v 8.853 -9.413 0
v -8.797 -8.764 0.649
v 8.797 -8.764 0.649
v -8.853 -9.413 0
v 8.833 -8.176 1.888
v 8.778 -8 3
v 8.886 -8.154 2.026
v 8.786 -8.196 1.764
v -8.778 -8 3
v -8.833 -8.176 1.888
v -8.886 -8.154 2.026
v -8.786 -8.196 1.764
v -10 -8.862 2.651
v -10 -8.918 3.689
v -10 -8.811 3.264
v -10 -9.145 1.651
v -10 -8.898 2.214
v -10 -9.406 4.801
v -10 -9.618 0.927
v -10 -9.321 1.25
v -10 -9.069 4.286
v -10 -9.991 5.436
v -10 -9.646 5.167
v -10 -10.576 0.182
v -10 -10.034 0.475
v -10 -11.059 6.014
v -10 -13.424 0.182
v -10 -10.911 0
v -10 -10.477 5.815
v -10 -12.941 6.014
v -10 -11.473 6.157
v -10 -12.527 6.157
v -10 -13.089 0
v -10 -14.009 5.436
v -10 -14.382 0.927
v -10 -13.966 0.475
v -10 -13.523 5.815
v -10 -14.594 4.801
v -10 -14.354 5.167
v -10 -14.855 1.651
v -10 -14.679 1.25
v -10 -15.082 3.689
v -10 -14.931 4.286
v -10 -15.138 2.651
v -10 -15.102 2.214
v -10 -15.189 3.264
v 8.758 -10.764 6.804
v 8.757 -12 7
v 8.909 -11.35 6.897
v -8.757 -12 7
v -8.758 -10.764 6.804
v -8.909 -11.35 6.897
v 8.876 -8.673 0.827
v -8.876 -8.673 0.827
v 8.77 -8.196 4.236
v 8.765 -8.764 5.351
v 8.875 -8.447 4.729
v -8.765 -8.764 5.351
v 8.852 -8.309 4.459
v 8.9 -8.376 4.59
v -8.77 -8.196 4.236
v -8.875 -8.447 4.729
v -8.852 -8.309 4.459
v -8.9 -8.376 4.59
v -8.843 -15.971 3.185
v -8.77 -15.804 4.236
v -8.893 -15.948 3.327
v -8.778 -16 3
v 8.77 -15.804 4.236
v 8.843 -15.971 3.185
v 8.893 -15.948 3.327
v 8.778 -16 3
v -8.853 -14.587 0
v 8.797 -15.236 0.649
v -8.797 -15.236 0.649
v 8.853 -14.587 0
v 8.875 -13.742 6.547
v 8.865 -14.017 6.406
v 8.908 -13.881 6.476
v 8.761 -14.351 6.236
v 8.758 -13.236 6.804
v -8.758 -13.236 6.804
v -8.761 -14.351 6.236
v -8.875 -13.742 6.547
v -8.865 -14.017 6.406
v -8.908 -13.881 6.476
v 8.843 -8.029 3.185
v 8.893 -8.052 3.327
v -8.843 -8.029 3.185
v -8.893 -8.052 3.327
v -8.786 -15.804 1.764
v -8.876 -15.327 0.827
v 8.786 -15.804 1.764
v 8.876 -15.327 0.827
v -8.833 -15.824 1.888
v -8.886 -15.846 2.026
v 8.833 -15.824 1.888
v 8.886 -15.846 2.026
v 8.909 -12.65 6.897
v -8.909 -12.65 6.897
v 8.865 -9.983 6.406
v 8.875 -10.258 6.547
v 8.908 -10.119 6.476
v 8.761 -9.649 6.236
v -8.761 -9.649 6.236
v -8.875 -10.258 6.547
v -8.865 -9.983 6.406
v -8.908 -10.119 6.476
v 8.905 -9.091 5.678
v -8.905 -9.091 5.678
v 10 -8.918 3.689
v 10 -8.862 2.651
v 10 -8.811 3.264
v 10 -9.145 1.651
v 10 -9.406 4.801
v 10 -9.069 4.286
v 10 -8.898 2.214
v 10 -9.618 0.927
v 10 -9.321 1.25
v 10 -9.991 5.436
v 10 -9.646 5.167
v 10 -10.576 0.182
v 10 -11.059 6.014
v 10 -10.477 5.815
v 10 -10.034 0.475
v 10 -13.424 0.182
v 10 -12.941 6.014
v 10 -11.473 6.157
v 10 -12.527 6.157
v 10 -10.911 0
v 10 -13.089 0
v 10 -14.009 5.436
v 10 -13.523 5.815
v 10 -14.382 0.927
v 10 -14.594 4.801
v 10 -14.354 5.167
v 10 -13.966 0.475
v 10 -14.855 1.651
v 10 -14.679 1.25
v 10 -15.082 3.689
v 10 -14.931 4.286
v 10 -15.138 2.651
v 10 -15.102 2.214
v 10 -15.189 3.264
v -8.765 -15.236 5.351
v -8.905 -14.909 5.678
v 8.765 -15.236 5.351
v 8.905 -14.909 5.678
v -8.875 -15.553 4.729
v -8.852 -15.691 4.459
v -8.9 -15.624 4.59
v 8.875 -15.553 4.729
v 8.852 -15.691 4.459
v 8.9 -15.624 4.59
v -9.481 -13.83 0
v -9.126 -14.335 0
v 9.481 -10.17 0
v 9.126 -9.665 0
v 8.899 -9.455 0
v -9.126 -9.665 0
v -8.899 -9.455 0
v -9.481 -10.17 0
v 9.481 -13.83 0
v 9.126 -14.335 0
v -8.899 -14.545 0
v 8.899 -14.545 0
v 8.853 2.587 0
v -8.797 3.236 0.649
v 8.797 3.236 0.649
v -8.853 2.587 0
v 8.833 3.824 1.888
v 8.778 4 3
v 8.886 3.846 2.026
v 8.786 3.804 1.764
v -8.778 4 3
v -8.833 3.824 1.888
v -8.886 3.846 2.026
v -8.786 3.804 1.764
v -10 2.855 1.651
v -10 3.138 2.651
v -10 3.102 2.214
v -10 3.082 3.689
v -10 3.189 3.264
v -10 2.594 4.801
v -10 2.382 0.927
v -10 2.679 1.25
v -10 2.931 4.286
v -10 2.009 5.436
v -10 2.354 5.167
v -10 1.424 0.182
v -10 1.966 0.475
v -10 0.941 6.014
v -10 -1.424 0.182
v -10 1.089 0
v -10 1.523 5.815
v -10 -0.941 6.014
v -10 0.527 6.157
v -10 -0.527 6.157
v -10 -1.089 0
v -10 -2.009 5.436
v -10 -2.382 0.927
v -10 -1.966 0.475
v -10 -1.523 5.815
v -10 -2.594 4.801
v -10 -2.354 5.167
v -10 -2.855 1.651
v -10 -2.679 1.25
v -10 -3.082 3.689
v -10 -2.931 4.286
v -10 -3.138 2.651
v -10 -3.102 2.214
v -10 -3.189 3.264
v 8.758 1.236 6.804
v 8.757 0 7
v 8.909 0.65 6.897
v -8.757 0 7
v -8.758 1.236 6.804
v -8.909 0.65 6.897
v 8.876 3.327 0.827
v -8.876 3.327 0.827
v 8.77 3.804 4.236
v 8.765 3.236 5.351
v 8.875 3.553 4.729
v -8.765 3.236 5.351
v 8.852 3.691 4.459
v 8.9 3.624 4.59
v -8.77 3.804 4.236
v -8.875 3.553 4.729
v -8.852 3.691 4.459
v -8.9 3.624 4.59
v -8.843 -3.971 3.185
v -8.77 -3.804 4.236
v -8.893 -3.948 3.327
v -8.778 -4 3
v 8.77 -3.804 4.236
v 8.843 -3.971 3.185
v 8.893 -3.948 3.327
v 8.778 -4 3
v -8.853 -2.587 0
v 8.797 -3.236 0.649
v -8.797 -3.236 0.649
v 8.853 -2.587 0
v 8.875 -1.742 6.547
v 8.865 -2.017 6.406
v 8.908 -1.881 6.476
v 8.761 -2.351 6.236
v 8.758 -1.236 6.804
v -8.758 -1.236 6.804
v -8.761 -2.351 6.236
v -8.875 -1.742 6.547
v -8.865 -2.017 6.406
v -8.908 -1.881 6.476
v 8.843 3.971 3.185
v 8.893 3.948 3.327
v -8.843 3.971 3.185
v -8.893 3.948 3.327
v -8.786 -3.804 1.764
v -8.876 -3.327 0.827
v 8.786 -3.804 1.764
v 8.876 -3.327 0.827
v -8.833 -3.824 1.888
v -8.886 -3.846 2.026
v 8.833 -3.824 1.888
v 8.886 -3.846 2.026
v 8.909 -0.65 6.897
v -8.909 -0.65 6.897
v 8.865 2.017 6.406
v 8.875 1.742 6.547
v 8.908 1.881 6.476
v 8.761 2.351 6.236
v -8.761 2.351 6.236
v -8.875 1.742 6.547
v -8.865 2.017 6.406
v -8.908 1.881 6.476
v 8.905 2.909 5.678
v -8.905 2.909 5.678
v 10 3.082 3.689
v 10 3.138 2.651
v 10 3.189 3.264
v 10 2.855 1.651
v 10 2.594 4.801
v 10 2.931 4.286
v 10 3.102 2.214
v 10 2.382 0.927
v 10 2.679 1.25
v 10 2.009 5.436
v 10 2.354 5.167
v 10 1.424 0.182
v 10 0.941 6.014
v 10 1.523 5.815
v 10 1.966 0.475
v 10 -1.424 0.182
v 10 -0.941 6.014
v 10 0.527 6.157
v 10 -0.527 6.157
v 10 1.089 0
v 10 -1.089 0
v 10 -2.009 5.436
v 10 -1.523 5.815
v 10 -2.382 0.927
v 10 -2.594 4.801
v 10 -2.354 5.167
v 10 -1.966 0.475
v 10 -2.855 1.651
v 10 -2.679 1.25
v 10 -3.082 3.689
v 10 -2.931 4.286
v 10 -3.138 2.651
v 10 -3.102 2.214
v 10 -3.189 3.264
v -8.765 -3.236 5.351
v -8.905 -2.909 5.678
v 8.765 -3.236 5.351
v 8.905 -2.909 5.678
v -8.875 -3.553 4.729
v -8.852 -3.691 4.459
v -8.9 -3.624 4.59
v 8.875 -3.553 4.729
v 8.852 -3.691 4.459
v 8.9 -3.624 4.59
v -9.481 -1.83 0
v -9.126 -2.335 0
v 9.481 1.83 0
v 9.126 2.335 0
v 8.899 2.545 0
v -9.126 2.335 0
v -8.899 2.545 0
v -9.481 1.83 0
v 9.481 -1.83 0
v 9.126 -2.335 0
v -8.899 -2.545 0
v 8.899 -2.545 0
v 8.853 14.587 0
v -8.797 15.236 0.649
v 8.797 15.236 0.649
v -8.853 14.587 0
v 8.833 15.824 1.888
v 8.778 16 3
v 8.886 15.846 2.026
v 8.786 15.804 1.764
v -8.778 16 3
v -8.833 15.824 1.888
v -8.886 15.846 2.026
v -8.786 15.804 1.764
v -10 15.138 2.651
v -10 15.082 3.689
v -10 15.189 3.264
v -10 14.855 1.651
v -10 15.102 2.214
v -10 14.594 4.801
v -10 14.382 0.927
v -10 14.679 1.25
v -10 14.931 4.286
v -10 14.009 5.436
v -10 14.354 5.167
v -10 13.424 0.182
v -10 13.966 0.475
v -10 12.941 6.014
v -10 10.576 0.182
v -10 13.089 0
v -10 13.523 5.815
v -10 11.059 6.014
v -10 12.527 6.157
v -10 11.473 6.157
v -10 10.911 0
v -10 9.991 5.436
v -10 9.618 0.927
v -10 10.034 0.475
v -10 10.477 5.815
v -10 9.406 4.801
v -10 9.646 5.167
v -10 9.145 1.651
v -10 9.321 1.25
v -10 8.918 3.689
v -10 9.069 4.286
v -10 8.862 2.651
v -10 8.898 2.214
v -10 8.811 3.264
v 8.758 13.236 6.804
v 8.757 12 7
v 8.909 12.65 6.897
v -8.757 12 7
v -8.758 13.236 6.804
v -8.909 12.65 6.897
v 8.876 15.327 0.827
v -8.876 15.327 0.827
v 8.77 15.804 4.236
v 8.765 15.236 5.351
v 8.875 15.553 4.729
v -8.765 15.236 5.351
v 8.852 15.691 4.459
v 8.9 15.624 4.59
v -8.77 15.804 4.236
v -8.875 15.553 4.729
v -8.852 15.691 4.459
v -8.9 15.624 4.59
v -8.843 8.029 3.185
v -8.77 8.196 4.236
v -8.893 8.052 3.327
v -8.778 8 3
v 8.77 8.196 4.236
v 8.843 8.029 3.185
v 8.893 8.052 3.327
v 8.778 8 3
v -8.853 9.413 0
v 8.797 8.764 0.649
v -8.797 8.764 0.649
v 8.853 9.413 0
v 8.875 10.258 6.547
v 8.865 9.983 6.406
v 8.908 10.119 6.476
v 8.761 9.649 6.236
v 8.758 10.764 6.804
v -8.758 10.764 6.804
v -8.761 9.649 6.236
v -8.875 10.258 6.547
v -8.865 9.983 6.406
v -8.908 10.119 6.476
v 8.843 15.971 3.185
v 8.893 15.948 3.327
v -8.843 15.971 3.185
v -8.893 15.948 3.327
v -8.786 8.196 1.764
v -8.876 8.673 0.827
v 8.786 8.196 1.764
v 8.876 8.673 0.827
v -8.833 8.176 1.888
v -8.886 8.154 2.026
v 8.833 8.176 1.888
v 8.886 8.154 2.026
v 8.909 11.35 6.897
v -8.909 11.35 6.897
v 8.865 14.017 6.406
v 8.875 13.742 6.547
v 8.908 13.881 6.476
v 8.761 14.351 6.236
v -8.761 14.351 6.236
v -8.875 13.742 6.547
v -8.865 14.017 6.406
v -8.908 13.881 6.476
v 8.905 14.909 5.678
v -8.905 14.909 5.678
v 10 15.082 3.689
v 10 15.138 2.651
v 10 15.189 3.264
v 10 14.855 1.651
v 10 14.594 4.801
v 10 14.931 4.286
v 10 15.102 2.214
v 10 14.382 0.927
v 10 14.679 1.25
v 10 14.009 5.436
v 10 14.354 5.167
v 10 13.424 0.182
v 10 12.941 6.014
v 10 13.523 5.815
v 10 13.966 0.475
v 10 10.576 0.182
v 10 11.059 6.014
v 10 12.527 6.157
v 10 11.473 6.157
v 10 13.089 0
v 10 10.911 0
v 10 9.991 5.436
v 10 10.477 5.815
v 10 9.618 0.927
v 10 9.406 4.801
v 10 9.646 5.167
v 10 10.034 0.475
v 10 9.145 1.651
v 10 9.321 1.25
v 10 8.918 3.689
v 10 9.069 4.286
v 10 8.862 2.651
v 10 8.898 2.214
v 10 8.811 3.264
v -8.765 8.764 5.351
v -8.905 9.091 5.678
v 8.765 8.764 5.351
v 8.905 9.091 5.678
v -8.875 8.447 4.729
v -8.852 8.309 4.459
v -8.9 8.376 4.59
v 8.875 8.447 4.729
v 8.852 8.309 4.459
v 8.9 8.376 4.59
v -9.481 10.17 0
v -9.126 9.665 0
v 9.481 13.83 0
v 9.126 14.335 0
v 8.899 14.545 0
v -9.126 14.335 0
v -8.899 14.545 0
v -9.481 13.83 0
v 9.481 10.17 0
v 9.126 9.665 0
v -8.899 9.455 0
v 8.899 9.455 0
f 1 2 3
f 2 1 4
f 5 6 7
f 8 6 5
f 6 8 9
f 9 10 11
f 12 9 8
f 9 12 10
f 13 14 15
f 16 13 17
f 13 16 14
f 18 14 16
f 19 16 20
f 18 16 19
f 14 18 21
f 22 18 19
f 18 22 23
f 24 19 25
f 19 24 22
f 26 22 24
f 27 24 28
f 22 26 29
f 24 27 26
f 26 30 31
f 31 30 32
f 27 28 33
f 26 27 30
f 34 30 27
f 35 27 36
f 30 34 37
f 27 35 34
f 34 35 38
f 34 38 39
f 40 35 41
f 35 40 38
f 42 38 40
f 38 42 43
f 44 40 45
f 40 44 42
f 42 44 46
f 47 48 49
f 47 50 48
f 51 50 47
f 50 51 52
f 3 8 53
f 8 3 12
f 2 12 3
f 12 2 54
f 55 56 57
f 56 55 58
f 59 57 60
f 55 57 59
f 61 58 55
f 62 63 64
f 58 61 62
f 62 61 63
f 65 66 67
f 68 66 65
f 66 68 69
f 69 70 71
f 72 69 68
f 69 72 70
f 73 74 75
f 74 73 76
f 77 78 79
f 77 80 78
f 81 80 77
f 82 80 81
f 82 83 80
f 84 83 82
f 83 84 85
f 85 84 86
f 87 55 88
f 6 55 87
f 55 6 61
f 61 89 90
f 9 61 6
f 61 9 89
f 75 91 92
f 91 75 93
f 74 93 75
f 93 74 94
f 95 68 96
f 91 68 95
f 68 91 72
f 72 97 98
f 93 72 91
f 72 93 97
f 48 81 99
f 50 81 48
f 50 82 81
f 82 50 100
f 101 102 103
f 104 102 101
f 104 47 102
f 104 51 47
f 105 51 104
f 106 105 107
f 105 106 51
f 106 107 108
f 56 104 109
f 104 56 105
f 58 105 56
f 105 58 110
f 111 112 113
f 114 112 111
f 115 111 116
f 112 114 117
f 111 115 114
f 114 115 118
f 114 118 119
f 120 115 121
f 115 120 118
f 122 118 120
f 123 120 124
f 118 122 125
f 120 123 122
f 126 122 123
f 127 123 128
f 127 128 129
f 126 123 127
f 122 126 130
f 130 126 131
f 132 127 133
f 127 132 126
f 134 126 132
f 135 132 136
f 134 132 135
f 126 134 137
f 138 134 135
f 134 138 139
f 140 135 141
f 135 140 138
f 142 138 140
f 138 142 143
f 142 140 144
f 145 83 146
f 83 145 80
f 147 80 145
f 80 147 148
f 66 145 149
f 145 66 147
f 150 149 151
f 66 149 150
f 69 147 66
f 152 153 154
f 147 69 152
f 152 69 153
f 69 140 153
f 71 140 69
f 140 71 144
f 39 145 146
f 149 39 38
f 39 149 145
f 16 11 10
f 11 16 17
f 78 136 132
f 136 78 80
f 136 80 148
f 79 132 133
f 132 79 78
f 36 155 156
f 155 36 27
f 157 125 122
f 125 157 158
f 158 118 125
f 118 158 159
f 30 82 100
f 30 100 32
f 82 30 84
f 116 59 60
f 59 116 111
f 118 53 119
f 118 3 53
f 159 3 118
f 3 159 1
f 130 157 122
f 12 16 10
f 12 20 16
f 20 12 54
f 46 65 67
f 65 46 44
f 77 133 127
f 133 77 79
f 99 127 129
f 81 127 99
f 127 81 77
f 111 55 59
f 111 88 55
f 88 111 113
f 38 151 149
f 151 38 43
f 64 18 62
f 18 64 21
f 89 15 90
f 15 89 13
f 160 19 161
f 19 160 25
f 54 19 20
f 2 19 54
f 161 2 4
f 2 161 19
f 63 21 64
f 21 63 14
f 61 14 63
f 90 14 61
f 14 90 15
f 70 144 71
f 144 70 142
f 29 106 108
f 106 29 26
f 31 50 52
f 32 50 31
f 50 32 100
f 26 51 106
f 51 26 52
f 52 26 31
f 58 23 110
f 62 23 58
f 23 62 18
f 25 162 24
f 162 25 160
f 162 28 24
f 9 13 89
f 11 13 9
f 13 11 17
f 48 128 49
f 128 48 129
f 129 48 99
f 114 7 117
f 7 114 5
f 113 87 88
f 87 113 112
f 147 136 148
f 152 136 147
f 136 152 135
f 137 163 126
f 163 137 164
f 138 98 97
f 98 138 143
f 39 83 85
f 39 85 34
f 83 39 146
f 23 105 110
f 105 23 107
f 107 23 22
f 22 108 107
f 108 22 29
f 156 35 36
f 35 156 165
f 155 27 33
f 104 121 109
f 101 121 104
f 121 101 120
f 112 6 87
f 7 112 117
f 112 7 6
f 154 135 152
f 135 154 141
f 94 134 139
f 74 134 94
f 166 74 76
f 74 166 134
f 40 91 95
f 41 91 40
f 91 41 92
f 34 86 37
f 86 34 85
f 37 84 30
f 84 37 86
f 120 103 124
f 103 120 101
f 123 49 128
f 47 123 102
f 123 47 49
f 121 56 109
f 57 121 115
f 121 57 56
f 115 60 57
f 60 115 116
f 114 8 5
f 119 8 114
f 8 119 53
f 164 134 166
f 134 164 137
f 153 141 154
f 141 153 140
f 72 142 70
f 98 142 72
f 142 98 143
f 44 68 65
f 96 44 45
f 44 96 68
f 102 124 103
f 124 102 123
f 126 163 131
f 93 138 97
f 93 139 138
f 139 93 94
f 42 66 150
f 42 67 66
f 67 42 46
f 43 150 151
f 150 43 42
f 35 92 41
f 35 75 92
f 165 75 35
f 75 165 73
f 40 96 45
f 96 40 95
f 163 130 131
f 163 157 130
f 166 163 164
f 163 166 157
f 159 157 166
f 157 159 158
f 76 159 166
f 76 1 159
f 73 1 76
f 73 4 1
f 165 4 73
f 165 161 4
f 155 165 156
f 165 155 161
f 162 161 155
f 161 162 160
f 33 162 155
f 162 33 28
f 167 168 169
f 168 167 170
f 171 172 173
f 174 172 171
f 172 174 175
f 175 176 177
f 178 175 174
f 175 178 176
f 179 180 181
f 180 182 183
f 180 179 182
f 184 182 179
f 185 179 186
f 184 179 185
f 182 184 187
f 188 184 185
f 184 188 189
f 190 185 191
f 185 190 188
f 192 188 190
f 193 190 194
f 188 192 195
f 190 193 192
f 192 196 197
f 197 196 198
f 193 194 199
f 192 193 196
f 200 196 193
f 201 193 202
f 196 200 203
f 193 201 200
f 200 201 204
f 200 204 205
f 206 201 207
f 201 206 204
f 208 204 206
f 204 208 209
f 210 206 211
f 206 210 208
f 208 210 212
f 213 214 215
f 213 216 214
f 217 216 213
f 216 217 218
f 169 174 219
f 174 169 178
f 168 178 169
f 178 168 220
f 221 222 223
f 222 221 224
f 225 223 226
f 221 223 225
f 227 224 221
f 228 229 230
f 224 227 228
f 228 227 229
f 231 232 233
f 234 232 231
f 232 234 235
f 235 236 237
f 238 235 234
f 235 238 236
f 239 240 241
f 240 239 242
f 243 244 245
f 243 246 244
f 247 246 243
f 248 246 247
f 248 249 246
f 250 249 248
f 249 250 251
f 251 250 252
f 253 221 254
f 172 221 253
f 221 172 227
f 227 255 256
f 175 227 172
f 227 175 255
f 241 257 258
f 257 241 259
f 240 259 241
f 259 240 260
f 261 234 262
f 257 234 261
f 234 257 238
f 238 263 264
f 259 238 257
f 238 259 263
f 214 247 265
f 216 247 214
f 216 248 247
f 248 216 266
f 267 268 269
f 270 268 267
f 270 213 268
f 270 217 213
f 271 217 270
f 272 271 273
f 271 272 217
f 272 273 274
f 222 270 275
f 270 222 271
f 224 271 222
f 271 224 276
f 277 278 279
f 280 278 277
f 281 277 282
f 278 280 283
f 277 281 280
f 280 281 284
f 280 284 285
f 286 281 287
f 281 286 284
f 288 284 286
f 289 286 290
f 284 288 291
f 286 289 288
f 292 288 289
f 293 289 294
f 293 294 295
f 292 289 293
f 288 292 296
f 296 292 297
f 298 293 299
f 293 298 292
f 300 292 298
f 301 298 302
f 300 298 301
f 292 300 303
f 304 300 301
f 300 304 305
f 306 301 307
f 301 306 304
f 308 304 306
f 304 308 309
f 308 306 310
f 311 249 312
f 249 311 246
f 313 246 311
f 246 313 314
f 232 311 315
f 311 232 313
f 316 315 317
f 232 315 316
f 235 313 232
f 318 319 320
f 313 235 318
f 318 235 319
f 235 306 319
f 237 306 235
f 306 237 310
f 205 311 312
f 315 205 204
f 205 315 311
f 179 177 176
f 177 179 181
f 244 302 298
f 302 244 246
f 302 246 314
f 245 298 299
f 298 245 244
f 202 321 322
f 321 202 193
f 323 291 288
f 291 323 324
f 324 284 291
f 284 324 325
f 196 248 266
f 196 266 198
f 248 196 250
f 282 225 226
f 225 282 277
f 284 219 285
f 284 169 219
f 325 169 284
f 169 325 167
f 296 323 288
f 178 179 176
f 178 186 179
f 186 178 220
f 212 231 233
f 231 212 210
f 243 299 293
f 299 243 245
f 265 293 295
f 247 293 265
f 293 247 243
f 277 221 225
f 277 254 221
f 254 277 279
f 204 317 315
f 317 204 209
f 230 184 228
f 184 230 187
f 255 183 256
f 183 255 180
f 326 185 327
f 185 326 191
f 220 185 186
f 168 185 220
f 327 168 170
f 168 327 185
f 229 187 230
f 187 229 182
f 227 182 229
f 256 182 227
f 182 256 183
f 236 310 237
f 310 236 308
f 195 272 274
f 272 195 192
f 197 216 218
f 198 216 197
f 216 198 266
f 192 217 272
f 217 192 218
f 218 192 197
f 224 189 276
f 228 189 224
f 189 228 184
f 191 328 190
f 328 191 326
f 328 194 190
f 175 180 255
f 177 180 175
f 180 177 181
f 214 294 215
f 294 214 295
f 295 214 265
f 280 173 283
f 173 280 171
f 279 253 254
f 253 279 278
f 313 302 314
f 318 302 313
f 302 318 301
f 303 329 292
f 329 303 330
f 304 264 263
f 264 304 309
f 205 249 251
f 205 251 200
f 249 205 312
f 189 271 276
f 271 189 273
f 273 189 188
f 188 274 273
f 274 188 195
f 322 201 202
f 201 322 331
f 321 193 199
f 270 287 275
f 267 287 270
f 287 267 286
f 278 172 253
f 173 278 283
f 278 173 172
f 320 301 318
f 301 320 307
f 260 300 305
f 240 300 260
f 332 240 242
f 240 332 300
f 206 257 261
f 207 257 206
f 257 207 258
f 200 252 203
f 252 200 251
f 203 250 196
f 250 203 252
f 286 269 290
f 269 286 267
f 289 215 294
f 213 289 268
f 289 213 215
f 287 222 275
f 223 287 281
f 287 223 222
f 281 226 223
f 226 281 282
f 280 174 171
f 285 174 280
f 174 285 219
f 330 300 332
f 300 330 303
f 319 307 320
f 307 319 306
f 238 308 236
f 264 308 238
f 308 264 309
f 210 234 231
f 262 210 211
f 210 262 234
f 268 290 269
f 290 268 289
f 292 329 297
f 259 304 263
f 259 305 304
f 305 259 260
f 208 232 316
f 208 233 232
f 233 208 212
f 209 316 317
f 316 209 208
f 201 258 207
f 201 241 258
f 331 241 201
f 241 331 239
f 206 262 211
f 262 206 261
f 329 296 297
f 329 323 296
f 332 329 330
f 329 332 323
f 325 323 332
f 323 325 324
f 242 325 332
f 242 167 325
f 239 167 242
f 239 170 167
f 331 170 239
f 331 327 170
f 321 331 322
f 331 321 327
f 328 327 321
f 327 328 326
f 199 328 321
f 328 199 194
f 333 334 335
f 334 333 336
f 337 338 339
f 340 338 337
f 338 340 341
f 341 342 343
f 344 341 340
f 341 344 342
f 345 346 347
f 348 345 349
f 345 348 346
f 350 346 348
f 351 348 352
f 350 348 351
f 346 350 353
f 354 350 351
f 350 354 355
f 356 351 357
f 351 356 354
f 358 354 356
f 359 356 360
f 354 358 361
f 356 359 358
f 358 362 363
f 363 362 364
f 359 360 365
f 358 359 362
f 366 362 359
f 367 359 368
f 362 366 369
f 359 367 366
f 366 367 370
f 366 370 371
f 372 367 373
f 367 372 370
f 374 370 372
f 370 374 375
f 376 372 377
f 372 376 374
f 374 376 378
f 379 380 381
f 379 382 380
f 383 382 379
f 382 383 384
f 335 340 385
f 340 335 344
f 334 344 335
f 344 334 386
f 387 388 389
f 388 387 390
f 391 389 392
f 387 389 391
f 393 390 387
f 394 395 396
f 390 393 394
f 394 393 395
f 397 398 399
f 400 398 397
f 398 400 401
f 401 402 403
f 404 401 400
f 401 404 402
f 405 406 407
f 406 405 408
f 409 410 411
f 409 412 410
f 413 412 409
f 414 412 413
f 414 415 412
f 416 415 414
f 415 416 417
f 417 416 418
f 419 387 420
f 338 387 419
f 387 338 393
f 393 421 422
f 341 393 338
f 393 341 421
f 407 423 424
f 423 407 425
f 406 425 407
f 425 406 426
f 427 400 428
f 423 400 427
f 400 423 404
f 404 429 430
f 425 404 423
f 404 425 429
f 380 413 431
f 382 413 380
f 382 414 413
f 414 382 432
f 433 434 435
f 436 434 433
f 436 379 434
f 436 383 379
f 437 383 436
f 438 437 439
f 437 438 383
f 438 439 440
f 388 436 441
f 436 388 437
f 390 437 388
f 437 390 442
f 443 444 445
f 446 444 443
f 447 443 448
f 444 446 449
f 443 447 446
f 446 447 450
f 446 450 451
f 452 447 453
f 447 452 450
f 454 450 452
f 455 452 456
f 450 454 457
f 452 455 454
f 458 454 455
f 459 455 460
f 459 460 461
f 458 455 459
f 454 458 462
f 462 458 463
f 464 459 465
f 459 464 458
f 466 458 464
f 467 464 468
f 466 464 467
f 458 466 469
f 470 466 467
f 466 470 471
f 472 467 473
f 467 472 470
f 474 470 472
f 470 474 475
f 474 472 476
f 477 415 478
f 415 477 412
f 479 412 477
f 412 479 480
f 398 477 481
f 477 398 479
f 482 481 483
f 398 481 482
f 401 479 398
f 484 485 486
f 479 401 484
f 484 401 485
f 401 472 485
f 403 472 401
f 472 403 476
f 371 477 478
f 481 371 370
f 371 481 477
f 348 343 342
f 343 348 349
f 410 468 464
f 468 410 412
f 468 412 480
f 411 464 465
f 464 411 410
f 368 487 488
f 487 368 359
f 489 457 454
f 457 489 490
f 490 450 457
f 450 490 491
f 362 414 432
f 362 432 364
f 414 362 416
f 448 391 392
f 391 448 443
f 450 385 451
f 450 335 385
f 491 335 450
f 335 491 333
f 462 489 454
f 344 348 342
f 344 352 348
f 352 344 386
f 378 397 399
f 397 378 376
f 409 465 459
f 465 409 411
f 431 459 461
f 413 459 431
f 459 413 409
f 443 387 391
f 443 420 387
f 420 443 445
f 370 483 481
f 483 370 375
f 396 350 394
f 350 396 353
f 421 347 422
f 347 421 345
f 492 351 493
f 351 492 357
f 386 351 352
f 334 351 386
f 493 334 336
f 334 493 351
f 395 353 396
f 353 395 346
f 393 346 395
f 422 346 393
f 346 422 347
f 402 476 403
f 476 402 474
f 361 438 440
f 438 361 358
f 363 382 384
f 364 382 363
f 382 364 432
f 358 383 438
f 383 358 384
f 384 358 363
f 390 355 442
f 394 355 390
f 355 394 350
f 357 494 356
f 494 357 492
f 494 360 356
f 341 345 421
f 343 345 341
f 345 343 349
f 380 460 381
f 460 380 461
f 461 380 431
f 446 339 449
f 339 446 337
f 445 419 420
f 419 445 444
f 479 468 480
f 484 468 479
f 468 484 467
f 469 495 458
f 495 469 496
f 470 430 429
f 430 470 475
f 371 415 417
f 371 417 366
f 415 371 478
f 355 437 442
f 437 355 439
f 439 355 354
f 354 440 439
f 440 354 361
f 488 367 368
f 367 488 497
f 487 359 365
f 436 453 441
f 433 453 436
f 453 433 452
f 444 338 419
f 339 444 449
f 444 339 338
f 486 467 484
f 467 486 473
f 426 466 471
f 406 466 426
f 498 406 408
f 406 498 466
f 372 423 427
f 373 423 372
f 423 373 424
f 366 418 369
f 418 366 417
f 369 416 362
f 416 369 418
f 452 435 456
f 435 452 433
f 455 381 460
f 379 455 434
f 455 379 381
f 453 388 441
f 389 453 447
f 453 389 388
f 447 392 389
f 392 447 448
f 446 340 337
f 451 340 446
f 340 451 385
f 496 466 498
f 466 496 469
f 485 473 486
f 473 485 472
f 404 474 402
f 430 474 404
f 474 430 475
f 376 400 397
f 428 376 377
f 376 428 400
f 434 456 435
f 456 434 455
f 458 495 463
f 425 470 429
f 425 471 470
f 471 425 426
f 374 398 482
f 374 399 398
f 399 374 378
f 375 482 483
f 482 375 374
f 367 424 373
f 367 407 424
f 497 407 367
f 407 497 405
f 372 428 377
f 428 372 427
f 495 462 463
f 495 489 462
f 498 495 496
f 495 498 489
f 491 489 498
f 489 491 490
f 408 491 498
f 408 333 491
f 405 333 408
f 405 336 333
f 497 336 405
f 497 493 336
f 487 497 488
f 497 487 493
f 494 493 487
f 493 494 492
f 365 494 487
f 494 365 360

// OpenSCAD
module tensioner_axle() {
  difference() {
    translate([0, 0, 3]) rotate([0, 90, 0]) intersection() {
      cylinder(r=4, h=20, center=true, $fn=20);
      scale([1, 1, 2]) sphere(r=6);
    }
    // Flat bottom for print surface.
    translate([0, 0, -10]) cube([22, 20, 20], center=true);
  }
}

// Print three axles at once to allow enough cooling time for each layer.
for (y = [-1:1]) {
  translate([0, y*12, 0]) tensioner_axle();
}
